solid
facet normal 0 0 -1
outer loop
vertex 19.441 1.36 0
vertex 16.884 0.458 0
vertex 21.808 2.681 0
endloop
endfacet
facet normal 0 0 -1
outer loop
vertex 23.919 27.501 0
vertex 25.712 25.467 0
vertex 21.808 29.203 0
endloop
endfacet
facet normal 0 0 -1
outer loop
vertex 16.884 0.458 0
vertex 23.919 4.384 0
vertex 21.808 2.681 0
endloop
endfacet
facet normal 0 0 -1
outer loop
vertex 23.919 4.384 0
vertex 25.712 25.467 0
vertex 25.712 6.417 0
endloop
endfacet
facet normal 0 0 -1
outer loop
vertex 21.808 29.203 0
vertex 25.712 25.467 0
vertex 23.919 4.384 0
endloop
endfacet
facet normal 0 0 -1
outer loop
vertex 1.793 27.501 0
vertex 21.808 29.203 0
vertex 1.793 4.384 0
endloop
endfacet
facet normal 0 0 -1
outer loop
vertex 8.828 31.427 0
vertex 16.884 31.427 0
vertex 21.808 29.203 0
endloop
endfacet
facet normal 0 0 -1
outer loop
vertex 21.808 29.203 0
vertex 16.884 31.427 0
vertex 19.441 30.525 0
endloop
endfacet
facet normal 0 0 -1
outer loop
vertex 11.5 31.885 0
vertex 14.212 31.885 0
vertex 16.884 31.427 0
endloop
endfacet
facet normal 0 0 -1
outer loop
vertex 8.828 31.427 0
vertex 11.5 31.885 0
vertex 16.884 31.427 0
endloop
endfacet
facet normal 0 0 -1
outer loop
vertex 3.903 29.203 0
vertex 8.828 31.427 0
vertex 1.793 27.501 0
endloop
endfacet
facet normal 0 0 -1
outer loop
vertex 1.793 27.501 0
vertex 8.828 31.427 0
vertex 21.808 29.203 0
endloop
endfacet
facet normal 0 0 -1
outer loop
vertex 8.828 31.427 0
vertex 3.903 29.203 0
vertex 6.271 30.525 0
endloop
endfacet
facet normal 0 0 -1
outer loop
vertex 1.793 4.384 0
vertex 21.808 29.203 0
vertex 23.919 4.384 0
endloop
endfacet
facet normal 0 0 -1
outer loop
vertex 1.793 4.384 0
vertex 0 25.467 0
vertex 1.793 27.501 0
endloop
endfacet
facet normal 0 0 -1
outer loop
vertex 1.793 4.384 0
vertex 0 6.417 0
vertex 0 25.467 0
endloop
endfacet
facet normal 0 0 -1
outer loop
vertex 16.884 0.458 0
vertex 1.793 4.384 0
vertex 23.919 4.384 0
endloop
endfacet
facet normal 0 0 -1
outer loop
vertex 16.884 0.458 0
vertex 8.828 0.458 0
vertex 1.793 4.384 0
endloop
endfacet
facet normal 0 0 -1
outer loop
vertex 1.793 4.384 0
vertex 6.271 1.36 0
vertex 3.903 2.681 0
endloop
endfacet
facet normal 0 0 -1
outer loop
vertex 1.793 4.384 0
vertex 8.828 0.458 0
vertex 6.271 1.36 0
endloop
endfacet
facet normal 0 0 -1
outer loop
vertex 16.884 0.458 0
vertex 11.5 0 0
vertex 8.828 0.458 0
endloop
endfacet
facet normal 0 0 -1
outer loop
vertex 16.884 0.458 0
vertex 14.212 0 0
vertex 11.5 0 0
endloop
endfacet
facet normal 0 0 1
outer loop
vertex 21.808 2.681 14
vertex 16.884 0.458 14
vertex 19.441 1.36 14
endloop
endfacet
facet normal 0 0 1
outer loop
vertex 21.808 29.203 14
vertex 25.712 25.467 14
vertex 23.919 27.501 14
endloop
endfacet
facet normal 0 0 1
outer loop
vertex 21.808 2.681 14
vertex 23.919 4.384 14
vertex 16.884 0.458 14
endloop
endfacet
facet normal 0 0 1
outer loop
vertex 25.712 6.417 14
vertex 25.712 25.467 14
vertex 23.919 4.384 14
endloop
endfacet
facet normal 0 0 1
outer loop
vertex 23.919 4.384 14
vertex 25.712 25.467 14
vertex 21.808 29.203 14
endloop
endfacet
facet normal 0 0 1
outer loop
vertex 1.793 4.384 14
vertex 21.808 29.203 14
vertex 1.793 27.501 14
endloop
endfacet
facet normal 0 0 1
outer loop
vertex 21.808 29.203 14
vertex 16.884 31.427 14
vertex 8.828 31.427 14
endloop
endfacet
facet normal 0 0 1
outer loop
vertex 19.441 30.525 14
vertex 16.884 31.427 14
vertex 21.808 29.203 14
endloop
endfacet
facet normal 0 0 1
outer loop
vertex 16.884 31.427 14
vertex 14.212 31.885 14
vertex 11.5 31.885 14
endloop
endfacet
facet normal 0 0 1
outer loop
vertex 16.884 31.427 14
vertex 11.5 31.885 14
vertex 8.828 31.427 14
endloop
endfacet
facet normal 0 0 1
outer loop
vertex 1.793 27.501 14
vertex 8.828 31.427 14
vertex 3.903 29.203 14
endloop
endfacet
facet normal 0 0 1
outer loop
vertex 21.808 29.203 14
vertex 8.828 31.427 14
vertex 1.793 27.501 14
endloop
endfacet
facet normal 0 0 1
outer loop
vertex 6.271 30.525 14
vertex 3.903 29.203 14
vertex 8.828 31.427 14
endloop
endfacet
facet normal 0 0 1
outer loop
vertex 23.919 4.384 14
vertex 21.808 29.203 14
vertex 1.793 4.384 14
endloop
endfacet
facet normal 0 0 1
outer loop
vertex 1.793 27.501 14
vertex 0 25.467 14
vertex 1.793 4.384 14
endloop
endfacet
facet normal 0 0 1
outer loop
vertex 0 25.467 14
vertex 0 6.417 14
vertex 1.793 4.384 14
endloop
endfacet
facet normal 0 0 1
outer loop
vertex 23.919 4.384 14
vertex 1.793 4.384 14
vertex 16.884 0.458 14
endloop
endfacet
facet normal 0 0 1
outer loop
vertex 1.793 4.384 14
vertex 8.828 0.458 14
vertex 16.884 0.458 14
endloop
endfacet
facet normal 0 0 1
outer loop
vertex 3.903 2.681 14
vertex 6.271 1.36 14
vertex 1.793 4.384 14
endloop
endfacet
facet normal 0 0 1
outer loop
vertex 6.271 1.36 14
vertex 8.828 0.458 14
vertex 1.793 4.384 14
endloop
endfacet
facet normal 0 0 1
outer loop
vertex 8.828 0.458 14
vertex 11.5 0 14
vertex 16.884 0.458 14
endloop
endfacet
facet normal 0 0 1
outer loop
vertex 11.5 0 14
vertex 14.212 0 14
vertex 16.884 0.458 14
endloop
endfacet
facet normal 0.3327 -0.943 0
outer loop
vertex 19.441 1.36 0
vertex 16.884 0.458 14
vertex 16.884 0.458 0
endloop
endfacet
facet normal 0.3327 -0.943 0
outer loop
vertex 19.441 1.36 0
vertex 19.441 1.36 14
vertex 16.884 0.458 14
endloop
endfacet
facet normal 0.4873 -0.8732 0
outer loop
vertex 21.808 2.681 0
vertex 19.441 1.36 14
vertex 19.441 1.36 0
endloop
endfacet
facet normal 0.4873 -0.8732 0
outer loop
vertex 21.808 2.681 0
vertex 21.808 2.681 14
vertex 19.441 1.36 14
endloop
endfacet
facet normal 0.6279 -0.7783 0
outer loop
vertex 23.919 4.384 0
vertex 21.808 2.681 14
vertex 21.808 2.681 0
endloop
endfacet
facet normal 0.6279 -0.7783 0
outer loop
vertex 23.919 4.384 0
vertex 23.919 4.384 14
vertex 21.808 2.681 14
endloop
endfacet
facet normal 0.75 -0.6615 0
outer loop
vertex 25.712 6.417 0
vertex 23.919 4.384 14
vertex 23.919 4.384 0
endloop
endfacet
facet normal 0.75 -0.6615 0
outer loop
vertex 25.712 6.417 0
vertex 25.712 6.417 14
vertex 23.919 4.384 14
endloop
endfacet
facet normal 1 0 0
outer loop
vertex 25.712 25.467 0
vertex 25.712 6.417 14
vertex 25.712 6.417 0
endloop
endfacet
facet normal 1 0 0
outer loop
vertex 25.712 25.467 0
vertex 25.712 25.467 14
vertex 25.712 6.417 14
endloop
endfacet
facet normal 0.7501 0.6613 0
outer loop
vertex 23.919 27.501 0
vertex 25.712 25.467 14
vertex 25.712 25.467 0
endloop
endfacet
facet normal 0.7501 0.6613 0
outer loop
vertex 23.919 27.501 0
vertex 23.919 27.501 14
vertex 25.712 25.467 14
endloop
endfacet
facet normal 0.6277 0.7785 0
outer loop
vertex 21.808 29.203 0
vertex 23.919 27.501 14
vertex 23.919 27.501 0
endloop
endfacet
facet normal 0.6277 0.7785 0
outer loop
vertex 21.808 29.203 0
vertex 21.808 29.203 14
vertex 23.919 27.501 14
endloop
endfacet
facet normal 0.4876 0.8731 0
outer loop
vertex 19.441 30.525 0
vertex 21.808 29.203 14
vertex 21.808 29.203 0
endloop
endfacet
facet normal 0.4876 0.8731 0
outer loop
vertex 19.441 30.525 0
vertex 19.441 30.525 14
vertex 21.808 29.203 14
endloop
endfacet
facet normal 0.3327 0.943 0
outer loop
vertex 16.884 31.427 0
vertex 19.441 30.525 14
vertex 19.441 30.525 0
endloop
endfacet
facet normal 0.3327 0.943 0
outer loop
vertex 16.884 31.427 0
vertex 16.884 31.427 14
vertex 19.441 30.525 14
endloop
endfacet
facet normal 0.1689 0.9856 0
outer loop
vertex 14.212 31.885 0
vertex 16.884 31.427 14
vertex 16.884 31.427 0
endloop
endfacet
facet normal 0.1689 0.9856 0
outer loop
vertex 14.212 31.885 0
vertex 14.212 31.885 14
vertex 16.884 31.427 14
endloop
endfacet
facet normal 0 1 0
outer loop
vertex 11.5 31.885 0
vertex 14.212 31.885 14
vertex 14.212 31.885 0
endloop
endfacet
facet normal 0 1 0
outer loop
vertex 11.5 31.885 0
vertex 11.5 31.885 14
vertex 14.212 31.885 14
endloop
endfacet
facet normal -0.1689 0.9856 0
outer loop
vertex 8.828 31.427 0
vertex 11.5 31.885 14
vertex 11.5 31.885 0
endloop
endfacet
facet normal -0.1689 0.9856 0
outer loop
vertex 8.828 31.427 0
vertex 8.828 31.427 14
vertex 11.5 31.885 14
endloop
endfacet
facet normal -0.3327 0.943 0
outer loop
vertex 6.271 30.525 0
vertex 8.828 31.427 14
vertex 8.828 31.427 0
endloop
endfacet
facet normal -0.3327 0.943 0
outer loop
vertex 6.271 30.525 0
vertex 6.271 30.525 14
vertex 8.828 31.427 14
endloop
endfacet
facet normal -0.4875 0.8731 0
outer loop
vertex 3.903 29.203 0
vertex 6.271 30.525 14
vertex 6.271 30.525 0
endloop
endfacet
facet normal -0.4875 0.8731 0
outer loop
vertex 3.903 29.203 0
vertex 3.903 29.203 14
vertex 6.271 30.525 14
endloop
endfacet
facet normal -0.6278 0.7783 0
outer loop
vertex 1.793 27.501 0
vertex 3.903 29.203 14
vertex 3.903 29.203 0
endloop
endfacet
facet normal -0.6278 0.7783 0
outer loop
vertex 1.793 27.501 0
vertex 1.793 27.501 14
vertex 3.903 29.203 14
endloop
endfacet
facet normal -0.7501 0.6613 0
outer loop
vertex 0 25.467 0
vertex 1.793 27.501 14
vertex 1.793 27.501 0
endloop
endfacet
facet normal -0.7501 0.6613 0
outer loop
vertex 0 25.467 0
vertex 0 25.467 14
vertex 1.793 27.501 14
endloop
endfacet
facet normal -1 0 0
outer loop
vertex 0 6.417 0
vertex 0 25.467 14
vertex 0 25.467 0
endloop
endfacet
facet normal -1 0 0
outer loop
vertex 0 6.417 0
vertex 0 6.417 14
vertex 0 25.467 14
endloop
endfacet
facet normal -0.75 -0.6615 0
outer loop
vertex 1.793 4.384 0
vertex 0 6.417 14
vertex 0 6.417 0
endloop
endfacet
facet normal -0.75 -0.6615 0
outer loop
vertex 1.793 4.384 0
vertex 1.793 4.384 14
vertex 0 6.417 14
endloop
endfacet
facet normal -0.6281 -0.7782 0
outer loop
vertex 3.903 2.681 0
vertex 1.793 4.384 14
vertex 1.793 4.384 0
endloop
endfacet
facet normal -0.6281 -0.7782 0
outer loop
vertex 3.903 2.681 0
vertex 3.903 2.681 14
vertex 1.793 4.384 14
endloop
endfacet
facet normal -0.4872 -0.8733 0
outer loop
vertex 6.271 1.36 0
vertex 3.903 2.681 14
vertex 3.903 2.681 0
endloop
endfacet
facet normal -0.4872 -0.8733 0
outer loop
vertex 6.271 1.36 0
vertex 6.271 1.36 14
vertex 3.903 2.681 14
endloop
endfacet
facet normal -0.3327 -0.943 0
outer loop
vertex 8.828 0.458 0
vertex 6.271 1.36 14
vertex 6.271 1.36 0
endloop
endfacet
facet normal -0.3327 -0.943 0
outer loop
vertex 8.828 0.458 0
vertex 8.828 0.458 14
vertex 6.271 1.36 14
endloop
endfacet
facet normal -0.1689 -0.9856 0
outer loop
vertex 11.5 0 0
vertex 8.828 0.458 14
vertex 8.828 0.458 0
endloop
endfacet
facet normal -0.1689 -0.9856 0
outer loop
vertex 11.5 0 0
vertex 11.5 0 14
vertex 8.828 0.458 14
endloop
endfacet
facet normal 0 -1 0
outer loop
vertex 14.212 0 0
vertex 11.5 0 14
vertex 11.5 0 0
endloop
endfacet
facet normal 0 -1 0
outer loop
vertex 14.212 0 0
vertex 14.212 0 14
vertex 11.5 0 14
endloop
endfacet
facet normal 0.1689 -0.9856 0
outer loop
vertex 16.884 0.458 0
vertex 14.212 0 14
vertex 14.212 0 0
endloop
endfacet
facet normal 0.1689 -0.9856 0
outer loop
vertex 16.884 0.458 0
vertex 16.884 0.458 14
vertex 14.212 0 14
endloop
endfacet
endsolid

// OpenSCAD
$fn = 32;

// ----------------------------------------------------------------------
// Flat adaptor: double_d, 14 mm thick
// ----------------------------------------------------------------------

// --- parameters (mm) ---
profile_height = 14;      // extrusion height
profile_points = 24;      // points of the closed outline

profile = [[25.712, 25.467], [23.919, 27.501], [21.808, 29.203], [19.441, 30.525], [16.884, 31.427], [14.212, 31.885], [11.5, 31.885], [8.828, 31.427], [6.271, 30.525], [3.903, 29.203], [1.793, 27.501], [0, 25.467], [0, 6.417], [1.793, 4.384], [3.903, 2.681], [6.271, 1.36], [8.828, 0.458], [11.5, 0], [14.212, 0], [16.884, 0.458], [19.441, 1.36], [21.808, 2.681], [23.919, 4.384], [25.712, 6.417]];  // single closed polygon, 24 points, counter clockwise

// --- the one profile operation ---
linear_extrude(height = profile_height) polygon(points = profile);
